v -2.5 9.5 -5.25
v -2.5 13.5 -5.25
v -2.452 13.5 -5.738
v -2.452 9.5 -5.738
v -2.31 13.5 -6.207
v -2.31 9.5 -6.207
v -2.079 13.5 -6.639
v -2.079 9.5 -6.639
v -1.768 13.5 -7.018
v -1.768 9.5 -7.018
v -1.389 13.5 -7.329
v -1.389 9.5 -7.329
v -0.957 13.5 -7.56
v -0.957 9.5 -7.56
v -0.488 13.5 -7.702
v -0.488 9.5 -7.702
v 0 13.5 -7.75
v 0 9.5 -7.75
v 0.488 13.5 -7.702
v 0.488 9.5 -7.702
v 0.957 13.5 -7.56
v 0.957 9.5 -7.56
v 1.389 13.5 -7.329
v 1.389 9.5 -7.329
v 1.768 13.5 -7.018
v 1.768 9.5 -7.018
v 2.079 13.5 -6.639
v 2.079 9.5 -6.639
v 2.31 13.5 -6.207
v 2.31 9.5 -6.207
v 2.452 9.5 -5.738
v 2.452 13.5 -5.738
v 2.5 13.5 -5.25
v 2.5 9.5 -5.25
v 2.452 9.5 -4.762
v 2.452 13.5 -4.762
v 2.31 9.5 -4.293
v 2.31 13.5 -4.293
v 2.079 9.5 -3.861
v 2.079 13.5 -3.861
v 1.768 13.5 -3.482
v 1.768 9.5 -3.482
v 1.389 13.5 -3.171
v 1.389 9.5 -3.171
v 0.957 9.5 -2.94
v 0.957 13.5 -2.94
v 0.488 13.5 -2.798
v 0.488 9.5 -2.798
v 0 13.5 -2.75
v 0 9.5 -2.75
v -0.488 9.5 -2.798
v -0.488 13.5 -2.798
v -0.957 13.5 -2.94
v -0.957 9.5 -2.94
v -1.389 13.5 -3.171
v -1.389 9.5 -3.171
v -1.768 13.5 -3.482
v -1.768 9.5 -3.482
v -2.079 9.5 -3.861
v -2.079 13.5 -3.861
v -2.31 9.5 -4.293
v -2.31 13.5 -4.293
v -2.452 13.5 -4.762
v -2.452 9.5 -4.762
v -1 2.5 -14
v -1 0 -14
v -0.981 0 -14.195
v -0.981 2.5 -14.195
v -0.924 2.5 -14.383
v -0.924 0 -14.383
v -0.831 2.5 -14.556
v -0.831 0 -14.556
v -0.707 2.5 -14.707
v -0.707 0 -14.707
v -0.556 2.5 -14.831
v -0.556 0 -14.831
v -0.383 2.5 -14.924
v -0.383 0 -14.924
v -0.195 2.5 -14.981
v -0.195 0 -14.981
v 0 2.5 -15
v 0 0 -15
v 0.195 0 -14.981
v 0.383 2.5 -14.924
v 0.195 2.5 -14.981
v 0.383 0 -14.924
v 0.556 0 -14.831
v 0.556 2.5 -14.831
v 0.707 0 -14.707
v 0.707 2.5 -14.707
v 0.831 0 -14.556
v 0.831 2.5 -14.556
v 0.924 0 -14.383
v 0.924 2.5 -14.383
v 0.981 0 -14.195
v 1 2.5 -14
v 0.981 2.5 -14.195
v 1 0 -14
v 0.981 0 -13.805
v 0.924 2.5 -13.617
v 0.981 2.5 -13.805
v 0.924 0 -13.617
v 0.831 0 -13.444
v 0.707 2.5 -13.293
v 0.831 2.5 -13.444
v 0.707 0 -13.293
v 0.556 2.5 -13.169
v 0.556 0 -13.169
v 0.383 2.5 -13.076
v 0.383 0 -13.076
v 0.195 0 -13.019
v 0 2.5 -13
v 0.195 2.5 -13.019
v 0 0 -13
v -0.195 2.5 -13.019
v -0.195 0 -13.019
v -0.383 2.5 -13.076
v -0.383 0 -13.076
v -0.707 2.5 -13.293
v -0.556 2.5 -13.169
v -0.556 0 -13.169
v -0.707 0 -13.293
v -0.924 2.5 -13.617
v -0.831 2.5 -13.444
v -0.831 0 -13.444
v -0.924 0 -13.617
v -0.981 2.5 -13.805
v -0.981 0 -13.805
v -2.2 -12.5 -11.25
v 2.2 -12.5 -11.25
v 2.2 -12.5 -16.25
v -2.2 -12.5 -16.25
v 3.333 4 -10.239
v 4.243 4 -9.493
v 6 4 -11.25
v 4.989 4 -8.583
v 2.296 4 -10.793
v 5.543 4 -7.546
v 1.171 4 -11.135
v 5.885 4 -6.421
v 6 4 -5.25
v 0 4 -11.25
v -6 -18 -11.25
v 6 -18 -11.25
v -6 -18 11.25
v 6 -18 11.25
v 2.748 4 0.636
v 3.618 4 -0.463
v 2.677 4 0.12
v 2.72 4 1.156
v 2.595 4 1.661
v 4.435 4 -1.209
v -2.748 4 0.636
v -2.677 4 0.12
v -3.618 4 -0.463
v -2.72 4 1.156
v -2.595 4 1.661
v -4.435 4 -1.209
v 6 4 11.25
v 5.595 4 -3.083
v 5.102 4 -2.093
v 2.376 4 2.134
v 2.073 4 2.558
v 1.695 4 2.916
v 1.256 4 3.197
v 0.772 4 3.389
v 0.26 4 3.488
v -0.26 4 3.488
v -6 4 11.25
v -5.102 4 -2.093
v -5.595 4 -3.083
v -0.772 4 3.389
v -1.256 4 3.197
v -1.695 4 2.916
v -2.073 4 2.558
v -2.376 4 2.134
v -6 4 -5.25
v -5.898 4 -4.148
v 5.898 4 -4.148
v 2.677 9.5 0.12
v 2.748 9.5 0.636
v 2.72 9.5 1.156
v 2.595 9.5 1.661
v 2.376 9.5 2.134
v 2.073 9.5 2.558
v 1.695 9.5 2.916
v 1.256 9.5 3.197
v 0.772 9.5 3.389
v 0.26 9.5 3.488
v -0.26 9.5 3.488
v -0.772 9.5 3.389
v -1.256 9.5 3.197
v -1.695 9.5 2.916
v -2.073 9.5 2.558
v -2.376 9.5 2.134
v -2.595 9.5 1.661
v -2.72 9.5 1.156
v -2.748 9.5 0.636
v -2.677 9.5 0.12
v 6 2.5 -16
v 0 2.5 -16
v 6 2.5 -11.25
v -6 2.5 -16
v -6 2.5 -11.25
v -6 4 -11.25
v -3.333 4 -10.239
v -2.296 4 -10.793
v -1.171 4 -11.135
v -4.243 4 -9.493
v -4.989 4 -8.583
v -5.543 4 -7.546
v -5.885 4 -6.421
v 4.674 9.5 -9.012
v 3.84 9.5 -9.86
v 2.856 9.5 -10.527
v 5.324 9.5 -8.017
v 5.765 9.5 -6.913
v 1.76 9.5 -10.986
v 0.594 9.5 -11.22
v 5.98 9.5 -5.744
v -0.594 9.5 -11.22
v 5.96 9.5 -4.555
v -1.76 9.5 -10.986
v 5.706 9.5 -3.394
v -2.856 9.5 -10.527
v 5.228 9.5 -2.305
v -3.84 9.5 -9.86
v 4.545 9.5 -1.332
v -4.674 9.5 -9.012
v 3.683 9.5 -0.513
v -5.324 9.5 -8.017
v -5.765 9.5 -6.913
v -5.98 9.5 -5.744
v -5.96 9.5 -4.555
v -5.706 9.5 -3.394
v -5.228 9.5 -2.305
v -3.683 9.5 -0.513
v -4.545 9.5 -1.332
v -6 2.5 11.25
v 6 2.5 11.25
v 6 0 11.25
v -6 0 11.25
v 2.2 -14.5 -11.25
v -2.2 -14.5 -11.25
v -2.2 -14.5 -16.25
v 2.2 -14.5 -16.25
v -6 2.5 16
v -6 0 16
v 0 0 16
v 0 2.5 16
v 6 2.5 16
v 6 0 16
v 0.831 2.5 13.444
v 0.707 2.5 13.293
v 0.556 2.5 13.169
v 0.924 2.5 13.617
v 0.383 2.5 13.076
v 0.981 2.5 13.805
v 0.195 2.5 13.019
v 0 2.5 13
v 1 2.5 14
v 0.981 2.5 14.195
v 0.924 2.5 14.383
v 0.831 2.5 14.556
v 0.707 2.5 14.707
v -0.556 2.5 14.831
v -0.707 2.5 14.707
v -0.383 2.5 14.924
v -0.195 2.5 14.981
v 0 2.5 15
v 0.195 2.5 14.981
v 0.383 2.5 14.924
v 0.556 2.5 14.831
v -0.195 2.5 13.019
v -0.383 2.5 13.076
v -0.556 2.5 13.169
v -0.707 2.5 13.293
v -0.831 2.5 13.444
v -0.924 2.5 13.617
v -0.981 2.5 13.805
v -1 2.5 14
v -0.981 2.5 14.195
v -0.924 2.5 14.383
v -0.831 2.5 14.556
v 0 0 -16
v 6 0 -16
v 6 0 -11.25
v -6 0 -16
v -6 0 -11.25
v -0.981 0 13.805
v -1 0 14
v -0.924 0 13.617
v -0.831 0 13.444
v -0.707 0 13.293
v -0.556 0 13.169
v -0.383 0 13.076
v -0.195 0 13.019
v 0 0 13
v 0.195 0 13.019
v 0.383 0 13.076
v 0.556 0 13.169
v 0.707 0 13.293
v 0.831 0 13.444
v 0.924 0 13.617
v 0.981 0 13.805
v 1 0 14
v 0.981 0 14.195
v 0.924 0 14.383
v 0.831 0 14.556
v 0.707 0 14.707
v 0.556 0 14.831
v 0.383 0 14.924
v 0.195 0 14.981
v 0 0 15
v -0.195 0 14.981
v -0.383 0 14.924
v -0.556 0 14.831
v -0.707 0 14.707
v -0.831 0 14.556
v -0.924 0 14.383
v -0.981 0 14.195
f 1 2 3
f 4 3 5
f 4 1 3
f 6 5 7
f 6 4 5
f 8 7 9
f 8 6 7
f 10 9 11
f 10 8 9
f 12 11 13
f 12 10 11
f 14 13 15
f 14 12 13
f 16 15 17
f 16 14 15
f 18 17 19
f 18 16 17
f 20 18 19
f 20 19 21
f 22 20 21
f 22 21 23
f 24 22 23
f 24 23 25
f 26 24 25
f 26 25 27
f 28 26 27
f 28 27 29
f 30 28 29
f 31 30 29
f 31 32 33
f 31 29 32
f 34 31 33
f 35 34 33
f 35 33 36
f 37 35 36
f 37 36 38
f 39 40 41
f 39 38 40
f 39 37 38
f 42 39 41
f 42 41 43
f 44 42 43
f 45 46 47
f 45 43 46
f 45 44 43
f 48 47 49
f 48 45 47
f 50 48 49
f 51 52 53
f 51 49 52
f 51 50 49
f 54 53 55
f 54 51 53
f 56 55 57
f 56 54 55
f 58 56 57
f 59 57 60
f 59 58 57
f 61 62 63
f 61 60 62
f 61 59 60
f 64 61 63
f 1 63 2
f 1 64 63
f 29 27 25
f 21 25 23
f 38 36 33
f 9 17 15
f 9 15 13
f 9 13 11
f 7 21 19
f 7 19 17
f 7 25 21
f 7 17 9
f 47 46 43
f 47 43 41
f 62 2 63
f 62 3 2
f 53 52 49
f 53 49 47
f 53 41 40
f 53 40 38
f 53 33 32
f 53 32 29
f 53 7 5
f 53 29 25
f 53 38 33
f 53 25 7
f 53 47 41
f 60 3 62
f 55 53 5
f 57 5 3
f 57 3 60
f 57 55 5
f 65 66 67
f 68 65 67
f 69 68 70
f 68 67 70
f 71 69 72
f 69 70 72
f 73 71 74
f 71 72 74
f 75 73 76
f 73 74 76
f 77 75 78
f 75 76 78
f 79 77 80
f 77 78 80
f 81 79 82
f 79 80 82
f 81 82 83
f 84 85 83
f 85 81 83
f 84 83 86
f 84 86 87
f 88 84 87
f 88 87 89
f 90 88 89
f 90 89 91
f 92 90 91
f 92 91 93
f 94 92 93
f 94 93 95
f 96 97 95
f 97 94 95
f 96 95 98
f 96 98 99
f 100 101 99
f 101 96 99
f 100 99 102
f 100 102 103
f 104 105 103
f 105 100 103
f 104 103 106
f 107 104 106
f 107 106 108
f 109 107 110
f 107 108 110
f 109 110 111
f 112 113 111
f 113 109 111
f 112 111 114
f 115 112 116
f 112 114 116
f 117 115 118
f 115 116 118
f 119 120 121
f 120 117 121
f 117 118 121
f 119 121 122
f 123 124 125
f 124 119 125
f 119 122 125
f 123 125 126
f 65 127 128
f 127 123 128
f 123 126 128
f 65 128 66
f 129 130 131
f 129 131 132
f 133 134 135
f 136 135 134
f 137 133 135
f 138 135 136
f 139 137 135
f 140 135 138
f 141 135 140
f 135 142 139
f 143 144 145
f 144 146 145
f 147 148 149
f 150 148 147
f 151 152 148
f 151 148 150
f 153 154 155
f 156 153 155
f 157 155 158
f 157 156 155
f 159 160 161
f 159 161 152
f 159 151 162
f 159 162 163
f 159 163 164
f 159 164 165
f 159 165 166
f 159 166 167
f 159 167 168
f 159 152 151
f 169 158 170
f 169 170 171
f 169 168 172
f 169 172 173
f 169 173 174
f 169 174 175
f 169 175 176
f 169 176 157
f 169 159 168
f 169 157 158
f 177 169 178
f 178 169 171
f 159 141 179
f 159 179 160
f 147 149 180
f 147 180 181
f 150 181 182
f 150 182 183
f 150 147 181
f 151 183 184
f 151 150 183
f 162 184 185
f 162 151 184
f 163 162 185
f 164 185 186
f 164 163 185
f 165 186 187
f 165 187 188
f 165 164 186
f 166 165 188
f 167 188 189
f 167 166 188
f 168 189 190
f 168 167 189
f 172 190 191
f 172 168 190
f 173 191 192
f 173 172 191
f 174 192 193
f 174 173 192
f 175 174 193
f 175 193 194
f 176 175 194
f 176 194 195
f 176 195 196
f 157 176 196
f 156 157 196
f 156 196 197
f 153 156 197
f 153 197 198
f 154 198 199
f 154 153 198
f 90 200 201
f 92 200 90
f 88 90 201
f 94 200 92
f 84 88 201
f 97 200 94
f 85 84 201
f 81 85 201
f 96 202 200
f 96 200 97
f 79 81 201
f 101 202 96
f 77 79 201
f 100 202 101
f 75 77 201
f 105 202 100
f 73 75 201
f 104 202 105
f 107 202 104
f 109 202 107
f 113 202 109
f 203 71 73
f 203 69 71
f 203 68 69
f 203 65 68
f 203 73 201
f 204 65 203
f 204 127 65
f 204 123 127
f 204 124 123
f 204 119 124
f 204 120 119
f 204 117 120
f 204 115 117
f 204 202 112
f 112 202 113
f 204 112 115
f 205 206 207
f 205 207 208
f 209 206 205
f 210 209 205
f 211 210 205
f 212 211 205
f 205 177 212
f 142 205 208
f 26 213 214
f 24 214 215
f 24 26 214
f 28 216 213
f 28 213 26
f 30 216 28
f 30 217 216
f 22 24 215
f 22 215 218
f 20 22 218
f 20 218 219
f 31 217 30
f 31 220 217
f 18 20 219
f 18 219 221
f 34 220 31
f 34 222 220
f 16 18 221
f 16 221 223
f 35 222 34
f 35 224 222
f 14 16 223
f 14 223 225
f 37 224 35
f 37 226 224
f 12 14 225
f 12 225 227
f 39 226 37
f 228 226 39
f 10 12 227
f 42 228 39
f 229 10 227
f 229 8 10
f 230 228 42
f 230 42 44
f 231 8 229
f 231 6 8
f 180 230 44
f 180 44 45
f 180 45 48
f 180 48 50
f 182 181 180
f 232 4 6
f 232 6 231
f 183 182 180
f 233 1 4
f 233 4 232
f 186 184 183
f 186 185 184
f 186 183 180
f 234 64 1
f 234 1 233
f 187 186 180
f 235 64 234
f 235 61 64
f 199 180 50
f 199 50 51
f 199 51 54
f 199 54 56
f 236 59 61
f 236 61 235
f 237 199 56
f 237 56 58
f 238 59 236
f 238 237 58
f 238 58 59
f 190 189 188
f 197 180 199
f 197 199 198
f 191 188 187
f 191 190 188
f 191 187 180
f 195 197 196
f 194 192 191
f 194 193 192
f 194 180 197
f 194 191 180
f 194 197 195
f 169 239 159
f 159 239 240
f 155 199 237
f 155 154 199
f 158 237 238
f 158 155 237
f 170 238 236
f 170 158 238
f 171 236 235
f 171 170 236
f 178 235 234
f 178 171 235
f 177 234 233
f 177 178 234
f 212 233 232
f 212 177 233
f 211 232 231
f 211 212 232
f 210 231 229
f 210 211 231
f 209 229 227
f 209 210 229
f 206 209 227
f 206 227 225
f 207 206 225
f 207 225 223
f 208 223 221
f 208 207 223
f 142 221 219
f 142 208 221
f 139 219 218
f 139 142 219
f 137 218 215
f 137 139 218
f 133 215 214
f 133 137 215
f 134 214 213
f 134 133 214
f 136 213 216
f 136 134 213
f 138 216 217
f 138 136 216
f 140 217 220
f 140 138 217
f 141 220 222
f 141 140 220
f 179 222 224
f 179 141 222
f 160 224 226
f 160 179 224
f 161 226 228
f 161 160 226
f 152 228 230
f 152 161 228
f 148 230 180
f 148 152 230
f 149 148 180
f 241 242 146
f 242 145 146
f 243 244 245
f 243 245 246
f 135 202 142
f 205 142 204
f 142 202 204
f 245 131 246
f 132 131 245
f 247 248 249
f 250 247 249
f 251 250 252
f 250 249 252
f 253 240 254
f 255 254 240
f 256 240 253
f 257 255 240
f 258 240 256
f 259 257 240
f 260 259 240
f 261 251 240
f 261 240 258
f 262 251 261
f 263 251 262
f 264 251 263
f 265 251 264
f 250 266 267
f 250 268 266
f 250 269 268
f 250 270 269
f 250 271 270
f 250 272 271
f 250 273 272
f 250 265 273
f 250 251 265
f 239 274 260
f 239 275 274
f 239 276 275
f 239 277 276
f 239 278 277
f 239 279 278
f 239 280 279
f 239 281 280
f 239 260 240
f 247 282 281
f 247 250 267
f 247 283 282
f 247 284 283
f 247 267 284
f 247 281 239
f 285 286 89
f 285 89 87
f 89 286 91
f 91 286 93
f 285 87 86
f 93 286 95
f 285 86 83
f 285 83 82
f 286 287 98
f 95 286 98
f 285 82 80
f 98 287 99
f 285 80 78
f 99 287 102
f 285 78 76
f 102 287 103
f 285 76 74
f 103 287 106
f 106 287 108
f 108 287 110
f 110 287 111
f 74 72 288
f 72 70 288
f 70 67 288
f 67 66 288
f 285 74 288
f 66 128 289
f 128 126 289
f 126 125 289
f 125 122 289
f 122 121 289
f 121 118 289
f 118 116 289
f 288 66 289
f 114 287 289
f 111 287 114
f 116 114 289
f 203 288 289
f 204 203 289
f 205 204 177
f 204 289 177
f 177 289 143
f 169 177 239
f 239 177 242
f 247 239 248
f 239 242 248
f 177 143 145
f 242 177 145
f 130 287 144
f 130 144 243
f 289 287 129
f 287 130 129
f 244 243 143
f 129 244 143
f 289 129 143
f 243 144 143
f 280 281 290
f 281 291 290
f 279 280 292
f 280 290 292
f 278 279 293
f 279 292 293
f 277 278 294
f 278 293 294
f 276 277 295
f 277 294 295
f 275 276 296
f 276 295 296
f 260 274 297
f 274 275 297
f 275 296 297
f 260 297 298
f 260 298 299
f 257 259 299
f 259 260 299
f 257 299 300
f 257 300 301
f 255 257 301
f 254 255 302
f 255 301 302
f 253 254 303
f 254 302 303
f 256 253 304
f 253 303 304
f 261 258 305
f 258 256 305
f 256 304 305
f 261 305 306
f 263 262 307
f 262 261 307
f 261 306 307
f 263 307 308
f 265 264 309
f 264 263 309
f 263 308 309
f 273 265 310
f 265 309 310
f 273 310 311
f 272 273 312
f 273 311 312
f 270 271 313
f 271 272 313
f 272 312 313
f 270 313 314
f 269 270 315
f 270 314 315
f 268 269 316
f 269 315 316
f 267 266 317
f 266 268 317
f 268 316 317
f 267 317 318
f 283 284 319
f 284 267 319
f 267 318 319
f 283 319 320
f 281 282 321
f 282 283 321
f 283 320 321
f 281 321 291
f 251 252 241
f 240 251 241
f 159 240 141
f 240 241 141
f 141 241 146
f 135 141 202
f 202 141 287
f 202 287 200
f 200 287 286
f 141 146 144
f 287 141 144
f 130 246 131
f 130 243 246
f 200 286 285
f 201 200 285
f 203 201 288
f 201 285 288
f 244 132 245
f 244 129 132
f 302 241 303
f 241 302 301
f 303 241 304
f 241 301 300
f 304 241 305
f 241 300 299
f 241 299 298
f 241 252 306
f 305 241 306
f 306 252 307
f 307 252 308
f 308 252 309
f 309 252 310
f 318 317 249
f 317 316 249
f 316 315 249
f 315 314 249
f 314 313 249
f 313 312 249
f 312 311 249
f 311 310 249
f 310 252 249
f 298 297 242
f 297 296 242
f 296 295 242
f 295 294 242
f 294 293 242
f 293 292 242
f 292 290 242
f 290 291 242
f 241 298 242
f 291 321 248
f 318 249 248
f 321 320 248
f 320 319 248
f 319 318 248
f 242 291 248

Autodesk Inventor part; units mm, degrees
ref_plane "YZ Plane" through (0, 0, 0) normal (1, 0, 0) x (0, 1, 0)
ref_plane "XZ Plane" through (0, 0, 0) normal (0, 1, 0) x (-1, 0, 0)
ref_plane "XY Plane" through (0, 0, 0) normal (0, 0, 1) x (1, 0, 0)
sketch "Sketch1" plane through (0, 0, 0) normal (0, 1, 0) x (-1, 0, 0)
  line L0 (-6, 11.25) -> (-6, -11.25)
  line L1 (-6, -11.25) -> (6, -11.25)
  line L2 (6, -11.25) -> (6, 11.25)
  line L3 (6, 11.25) -> (-6, 11.25)
  line L4 (-6, 11.25) -> (6, -11.25) construction
  line L5 (-6, -11.25) -> (6, 11.25) construction
  line L6 (-6, 16) -> (-6, -16)
  line L7 (-6, -16) -> (6, -16)
  line L8 (6, -16) -> (6, 16)
  line L9 (6, 16) -> (-6, 16)
  line L10 (-6, 16) -> (6, -16) construction
  line L11 (-6, -16) -> (6, 16) construction
  circle A0 centre (0, -5.25) radius 6
  circle A1 centre (0, -5.25) radius 2.5
  circle A2 centre (0, 0.75) radius 2.75
  line L12 (0, 16) -> (0, 14)
  circle A3 centre (0, 14) radius 1
  line L13 (0, -16) -> (0, -14)
  circle A4 centre (0, -14) radius 1
  point P0 (0, 0)
  point P1 (-2.6768, 0.1198)
  point P2 (2.6768, 0.1198)
  dimension "d11" = 22.5
  dimension "d12" = 12
  dimension "d13" = 32
  dimension "d18" = 6
  dimension "d19" = 5
  dimension "d20" = 5.5
  dimension "d25" = 2
  dimension "d26" = 2
  dimension "d27" = 2
  dimension "d28" = 2
extrude "Extrusion1" add sketch "Sketch1" along normal blind 4 and the other way blind 18 contours L3 L2 A0 A2 L0 | A0 L1 L0 | A0 A2 | A2 A0 | A0 A2 | A0 L2 L1 | A1
extrude "Extrusion3" add sketch "Sketch1" along normal blind 2.5 contours L3 L2 A0 A2 L0 | L6 L9 L8 L3 | A0 L1 L0 | A0 A2 | L1 L8 L7 L6 | A2 A0 | A0 A2 | A0 L2 L1 | A1
extrude "Extrusion4" add sketch "Sketch1" along normal blind 9.5 contours A0 A2 | A2 A0 | A0 A2 | A1
extrude "Extrusion5" add sketch "Sketch1" along normal blind 13.5 contours A1
sketch "Sketch3" plane through (-6, -18, -11.25) normal (-1, 0, 0) x (0, 0, 1)
  line L0 (0, 0) -> (0, 18) projected
  line L1 (0, 0) -> (0, 18)
  line L2 (-4.75, 20.5) -> (0, 20.5) projected
  line L3 (0, 18) -> (0, 20.5)
  line L4 (0, 22) -> (6, 22) projected
  line L5 (0, 20.5) -> (0, 22)
  line L6 (-3.75, 20.5) -> (-3.75, 18) projected
  line L7 (-3.75, 20.5) -> (-1.75, 20.5)
  line L8 (-1.75, 20.5) -> (-1.75, 18) projected
  line L9 (22.5, 0) -> (0, 0) projected
  line L10 (0, 0) -> (22.5, 0)
  point P0 (11.25, 18)
  dimension "d29" = 2.5
  dimension "d31" = 18
  dimension "d32" = 1.5
  dimension "d33" = 4.75
  dimension "d34" = 2
  dimension "d35" = 1
  dimension "d36" = 22.5
sketch "Sketch4" plane through (6, -18, -11.25) normal (0, 0, -1) x (-1, 0, 0)
  line L0 (0, 0) -> (12, 0) projected
  line L1 (0, 0) -> (3.8, 0)
  line L2 (3.8, 0) -> (3.8, 3.5)
  line L3 (3.8, 3.5) -> (3.8, 5.5)
  line L4 (3.8, 5.5) -> (8.2, 5.5)
  line L5 (8.2, 5.5) -> (8.2, 3.5)
  line L6 (8.2, 3.5) -> (3.8, 3.5)
  point P0 (6, 18)
  dimension "d37" = 3.8
  dimension "d38" = 3.5
  dimension "d39" = 2
  dimension "d40" = 4.4
extrude "Extrusion6" add sketch "Sketch4" along normal blind 5
properties part number "servo" material "Acetal Resin, Black"
